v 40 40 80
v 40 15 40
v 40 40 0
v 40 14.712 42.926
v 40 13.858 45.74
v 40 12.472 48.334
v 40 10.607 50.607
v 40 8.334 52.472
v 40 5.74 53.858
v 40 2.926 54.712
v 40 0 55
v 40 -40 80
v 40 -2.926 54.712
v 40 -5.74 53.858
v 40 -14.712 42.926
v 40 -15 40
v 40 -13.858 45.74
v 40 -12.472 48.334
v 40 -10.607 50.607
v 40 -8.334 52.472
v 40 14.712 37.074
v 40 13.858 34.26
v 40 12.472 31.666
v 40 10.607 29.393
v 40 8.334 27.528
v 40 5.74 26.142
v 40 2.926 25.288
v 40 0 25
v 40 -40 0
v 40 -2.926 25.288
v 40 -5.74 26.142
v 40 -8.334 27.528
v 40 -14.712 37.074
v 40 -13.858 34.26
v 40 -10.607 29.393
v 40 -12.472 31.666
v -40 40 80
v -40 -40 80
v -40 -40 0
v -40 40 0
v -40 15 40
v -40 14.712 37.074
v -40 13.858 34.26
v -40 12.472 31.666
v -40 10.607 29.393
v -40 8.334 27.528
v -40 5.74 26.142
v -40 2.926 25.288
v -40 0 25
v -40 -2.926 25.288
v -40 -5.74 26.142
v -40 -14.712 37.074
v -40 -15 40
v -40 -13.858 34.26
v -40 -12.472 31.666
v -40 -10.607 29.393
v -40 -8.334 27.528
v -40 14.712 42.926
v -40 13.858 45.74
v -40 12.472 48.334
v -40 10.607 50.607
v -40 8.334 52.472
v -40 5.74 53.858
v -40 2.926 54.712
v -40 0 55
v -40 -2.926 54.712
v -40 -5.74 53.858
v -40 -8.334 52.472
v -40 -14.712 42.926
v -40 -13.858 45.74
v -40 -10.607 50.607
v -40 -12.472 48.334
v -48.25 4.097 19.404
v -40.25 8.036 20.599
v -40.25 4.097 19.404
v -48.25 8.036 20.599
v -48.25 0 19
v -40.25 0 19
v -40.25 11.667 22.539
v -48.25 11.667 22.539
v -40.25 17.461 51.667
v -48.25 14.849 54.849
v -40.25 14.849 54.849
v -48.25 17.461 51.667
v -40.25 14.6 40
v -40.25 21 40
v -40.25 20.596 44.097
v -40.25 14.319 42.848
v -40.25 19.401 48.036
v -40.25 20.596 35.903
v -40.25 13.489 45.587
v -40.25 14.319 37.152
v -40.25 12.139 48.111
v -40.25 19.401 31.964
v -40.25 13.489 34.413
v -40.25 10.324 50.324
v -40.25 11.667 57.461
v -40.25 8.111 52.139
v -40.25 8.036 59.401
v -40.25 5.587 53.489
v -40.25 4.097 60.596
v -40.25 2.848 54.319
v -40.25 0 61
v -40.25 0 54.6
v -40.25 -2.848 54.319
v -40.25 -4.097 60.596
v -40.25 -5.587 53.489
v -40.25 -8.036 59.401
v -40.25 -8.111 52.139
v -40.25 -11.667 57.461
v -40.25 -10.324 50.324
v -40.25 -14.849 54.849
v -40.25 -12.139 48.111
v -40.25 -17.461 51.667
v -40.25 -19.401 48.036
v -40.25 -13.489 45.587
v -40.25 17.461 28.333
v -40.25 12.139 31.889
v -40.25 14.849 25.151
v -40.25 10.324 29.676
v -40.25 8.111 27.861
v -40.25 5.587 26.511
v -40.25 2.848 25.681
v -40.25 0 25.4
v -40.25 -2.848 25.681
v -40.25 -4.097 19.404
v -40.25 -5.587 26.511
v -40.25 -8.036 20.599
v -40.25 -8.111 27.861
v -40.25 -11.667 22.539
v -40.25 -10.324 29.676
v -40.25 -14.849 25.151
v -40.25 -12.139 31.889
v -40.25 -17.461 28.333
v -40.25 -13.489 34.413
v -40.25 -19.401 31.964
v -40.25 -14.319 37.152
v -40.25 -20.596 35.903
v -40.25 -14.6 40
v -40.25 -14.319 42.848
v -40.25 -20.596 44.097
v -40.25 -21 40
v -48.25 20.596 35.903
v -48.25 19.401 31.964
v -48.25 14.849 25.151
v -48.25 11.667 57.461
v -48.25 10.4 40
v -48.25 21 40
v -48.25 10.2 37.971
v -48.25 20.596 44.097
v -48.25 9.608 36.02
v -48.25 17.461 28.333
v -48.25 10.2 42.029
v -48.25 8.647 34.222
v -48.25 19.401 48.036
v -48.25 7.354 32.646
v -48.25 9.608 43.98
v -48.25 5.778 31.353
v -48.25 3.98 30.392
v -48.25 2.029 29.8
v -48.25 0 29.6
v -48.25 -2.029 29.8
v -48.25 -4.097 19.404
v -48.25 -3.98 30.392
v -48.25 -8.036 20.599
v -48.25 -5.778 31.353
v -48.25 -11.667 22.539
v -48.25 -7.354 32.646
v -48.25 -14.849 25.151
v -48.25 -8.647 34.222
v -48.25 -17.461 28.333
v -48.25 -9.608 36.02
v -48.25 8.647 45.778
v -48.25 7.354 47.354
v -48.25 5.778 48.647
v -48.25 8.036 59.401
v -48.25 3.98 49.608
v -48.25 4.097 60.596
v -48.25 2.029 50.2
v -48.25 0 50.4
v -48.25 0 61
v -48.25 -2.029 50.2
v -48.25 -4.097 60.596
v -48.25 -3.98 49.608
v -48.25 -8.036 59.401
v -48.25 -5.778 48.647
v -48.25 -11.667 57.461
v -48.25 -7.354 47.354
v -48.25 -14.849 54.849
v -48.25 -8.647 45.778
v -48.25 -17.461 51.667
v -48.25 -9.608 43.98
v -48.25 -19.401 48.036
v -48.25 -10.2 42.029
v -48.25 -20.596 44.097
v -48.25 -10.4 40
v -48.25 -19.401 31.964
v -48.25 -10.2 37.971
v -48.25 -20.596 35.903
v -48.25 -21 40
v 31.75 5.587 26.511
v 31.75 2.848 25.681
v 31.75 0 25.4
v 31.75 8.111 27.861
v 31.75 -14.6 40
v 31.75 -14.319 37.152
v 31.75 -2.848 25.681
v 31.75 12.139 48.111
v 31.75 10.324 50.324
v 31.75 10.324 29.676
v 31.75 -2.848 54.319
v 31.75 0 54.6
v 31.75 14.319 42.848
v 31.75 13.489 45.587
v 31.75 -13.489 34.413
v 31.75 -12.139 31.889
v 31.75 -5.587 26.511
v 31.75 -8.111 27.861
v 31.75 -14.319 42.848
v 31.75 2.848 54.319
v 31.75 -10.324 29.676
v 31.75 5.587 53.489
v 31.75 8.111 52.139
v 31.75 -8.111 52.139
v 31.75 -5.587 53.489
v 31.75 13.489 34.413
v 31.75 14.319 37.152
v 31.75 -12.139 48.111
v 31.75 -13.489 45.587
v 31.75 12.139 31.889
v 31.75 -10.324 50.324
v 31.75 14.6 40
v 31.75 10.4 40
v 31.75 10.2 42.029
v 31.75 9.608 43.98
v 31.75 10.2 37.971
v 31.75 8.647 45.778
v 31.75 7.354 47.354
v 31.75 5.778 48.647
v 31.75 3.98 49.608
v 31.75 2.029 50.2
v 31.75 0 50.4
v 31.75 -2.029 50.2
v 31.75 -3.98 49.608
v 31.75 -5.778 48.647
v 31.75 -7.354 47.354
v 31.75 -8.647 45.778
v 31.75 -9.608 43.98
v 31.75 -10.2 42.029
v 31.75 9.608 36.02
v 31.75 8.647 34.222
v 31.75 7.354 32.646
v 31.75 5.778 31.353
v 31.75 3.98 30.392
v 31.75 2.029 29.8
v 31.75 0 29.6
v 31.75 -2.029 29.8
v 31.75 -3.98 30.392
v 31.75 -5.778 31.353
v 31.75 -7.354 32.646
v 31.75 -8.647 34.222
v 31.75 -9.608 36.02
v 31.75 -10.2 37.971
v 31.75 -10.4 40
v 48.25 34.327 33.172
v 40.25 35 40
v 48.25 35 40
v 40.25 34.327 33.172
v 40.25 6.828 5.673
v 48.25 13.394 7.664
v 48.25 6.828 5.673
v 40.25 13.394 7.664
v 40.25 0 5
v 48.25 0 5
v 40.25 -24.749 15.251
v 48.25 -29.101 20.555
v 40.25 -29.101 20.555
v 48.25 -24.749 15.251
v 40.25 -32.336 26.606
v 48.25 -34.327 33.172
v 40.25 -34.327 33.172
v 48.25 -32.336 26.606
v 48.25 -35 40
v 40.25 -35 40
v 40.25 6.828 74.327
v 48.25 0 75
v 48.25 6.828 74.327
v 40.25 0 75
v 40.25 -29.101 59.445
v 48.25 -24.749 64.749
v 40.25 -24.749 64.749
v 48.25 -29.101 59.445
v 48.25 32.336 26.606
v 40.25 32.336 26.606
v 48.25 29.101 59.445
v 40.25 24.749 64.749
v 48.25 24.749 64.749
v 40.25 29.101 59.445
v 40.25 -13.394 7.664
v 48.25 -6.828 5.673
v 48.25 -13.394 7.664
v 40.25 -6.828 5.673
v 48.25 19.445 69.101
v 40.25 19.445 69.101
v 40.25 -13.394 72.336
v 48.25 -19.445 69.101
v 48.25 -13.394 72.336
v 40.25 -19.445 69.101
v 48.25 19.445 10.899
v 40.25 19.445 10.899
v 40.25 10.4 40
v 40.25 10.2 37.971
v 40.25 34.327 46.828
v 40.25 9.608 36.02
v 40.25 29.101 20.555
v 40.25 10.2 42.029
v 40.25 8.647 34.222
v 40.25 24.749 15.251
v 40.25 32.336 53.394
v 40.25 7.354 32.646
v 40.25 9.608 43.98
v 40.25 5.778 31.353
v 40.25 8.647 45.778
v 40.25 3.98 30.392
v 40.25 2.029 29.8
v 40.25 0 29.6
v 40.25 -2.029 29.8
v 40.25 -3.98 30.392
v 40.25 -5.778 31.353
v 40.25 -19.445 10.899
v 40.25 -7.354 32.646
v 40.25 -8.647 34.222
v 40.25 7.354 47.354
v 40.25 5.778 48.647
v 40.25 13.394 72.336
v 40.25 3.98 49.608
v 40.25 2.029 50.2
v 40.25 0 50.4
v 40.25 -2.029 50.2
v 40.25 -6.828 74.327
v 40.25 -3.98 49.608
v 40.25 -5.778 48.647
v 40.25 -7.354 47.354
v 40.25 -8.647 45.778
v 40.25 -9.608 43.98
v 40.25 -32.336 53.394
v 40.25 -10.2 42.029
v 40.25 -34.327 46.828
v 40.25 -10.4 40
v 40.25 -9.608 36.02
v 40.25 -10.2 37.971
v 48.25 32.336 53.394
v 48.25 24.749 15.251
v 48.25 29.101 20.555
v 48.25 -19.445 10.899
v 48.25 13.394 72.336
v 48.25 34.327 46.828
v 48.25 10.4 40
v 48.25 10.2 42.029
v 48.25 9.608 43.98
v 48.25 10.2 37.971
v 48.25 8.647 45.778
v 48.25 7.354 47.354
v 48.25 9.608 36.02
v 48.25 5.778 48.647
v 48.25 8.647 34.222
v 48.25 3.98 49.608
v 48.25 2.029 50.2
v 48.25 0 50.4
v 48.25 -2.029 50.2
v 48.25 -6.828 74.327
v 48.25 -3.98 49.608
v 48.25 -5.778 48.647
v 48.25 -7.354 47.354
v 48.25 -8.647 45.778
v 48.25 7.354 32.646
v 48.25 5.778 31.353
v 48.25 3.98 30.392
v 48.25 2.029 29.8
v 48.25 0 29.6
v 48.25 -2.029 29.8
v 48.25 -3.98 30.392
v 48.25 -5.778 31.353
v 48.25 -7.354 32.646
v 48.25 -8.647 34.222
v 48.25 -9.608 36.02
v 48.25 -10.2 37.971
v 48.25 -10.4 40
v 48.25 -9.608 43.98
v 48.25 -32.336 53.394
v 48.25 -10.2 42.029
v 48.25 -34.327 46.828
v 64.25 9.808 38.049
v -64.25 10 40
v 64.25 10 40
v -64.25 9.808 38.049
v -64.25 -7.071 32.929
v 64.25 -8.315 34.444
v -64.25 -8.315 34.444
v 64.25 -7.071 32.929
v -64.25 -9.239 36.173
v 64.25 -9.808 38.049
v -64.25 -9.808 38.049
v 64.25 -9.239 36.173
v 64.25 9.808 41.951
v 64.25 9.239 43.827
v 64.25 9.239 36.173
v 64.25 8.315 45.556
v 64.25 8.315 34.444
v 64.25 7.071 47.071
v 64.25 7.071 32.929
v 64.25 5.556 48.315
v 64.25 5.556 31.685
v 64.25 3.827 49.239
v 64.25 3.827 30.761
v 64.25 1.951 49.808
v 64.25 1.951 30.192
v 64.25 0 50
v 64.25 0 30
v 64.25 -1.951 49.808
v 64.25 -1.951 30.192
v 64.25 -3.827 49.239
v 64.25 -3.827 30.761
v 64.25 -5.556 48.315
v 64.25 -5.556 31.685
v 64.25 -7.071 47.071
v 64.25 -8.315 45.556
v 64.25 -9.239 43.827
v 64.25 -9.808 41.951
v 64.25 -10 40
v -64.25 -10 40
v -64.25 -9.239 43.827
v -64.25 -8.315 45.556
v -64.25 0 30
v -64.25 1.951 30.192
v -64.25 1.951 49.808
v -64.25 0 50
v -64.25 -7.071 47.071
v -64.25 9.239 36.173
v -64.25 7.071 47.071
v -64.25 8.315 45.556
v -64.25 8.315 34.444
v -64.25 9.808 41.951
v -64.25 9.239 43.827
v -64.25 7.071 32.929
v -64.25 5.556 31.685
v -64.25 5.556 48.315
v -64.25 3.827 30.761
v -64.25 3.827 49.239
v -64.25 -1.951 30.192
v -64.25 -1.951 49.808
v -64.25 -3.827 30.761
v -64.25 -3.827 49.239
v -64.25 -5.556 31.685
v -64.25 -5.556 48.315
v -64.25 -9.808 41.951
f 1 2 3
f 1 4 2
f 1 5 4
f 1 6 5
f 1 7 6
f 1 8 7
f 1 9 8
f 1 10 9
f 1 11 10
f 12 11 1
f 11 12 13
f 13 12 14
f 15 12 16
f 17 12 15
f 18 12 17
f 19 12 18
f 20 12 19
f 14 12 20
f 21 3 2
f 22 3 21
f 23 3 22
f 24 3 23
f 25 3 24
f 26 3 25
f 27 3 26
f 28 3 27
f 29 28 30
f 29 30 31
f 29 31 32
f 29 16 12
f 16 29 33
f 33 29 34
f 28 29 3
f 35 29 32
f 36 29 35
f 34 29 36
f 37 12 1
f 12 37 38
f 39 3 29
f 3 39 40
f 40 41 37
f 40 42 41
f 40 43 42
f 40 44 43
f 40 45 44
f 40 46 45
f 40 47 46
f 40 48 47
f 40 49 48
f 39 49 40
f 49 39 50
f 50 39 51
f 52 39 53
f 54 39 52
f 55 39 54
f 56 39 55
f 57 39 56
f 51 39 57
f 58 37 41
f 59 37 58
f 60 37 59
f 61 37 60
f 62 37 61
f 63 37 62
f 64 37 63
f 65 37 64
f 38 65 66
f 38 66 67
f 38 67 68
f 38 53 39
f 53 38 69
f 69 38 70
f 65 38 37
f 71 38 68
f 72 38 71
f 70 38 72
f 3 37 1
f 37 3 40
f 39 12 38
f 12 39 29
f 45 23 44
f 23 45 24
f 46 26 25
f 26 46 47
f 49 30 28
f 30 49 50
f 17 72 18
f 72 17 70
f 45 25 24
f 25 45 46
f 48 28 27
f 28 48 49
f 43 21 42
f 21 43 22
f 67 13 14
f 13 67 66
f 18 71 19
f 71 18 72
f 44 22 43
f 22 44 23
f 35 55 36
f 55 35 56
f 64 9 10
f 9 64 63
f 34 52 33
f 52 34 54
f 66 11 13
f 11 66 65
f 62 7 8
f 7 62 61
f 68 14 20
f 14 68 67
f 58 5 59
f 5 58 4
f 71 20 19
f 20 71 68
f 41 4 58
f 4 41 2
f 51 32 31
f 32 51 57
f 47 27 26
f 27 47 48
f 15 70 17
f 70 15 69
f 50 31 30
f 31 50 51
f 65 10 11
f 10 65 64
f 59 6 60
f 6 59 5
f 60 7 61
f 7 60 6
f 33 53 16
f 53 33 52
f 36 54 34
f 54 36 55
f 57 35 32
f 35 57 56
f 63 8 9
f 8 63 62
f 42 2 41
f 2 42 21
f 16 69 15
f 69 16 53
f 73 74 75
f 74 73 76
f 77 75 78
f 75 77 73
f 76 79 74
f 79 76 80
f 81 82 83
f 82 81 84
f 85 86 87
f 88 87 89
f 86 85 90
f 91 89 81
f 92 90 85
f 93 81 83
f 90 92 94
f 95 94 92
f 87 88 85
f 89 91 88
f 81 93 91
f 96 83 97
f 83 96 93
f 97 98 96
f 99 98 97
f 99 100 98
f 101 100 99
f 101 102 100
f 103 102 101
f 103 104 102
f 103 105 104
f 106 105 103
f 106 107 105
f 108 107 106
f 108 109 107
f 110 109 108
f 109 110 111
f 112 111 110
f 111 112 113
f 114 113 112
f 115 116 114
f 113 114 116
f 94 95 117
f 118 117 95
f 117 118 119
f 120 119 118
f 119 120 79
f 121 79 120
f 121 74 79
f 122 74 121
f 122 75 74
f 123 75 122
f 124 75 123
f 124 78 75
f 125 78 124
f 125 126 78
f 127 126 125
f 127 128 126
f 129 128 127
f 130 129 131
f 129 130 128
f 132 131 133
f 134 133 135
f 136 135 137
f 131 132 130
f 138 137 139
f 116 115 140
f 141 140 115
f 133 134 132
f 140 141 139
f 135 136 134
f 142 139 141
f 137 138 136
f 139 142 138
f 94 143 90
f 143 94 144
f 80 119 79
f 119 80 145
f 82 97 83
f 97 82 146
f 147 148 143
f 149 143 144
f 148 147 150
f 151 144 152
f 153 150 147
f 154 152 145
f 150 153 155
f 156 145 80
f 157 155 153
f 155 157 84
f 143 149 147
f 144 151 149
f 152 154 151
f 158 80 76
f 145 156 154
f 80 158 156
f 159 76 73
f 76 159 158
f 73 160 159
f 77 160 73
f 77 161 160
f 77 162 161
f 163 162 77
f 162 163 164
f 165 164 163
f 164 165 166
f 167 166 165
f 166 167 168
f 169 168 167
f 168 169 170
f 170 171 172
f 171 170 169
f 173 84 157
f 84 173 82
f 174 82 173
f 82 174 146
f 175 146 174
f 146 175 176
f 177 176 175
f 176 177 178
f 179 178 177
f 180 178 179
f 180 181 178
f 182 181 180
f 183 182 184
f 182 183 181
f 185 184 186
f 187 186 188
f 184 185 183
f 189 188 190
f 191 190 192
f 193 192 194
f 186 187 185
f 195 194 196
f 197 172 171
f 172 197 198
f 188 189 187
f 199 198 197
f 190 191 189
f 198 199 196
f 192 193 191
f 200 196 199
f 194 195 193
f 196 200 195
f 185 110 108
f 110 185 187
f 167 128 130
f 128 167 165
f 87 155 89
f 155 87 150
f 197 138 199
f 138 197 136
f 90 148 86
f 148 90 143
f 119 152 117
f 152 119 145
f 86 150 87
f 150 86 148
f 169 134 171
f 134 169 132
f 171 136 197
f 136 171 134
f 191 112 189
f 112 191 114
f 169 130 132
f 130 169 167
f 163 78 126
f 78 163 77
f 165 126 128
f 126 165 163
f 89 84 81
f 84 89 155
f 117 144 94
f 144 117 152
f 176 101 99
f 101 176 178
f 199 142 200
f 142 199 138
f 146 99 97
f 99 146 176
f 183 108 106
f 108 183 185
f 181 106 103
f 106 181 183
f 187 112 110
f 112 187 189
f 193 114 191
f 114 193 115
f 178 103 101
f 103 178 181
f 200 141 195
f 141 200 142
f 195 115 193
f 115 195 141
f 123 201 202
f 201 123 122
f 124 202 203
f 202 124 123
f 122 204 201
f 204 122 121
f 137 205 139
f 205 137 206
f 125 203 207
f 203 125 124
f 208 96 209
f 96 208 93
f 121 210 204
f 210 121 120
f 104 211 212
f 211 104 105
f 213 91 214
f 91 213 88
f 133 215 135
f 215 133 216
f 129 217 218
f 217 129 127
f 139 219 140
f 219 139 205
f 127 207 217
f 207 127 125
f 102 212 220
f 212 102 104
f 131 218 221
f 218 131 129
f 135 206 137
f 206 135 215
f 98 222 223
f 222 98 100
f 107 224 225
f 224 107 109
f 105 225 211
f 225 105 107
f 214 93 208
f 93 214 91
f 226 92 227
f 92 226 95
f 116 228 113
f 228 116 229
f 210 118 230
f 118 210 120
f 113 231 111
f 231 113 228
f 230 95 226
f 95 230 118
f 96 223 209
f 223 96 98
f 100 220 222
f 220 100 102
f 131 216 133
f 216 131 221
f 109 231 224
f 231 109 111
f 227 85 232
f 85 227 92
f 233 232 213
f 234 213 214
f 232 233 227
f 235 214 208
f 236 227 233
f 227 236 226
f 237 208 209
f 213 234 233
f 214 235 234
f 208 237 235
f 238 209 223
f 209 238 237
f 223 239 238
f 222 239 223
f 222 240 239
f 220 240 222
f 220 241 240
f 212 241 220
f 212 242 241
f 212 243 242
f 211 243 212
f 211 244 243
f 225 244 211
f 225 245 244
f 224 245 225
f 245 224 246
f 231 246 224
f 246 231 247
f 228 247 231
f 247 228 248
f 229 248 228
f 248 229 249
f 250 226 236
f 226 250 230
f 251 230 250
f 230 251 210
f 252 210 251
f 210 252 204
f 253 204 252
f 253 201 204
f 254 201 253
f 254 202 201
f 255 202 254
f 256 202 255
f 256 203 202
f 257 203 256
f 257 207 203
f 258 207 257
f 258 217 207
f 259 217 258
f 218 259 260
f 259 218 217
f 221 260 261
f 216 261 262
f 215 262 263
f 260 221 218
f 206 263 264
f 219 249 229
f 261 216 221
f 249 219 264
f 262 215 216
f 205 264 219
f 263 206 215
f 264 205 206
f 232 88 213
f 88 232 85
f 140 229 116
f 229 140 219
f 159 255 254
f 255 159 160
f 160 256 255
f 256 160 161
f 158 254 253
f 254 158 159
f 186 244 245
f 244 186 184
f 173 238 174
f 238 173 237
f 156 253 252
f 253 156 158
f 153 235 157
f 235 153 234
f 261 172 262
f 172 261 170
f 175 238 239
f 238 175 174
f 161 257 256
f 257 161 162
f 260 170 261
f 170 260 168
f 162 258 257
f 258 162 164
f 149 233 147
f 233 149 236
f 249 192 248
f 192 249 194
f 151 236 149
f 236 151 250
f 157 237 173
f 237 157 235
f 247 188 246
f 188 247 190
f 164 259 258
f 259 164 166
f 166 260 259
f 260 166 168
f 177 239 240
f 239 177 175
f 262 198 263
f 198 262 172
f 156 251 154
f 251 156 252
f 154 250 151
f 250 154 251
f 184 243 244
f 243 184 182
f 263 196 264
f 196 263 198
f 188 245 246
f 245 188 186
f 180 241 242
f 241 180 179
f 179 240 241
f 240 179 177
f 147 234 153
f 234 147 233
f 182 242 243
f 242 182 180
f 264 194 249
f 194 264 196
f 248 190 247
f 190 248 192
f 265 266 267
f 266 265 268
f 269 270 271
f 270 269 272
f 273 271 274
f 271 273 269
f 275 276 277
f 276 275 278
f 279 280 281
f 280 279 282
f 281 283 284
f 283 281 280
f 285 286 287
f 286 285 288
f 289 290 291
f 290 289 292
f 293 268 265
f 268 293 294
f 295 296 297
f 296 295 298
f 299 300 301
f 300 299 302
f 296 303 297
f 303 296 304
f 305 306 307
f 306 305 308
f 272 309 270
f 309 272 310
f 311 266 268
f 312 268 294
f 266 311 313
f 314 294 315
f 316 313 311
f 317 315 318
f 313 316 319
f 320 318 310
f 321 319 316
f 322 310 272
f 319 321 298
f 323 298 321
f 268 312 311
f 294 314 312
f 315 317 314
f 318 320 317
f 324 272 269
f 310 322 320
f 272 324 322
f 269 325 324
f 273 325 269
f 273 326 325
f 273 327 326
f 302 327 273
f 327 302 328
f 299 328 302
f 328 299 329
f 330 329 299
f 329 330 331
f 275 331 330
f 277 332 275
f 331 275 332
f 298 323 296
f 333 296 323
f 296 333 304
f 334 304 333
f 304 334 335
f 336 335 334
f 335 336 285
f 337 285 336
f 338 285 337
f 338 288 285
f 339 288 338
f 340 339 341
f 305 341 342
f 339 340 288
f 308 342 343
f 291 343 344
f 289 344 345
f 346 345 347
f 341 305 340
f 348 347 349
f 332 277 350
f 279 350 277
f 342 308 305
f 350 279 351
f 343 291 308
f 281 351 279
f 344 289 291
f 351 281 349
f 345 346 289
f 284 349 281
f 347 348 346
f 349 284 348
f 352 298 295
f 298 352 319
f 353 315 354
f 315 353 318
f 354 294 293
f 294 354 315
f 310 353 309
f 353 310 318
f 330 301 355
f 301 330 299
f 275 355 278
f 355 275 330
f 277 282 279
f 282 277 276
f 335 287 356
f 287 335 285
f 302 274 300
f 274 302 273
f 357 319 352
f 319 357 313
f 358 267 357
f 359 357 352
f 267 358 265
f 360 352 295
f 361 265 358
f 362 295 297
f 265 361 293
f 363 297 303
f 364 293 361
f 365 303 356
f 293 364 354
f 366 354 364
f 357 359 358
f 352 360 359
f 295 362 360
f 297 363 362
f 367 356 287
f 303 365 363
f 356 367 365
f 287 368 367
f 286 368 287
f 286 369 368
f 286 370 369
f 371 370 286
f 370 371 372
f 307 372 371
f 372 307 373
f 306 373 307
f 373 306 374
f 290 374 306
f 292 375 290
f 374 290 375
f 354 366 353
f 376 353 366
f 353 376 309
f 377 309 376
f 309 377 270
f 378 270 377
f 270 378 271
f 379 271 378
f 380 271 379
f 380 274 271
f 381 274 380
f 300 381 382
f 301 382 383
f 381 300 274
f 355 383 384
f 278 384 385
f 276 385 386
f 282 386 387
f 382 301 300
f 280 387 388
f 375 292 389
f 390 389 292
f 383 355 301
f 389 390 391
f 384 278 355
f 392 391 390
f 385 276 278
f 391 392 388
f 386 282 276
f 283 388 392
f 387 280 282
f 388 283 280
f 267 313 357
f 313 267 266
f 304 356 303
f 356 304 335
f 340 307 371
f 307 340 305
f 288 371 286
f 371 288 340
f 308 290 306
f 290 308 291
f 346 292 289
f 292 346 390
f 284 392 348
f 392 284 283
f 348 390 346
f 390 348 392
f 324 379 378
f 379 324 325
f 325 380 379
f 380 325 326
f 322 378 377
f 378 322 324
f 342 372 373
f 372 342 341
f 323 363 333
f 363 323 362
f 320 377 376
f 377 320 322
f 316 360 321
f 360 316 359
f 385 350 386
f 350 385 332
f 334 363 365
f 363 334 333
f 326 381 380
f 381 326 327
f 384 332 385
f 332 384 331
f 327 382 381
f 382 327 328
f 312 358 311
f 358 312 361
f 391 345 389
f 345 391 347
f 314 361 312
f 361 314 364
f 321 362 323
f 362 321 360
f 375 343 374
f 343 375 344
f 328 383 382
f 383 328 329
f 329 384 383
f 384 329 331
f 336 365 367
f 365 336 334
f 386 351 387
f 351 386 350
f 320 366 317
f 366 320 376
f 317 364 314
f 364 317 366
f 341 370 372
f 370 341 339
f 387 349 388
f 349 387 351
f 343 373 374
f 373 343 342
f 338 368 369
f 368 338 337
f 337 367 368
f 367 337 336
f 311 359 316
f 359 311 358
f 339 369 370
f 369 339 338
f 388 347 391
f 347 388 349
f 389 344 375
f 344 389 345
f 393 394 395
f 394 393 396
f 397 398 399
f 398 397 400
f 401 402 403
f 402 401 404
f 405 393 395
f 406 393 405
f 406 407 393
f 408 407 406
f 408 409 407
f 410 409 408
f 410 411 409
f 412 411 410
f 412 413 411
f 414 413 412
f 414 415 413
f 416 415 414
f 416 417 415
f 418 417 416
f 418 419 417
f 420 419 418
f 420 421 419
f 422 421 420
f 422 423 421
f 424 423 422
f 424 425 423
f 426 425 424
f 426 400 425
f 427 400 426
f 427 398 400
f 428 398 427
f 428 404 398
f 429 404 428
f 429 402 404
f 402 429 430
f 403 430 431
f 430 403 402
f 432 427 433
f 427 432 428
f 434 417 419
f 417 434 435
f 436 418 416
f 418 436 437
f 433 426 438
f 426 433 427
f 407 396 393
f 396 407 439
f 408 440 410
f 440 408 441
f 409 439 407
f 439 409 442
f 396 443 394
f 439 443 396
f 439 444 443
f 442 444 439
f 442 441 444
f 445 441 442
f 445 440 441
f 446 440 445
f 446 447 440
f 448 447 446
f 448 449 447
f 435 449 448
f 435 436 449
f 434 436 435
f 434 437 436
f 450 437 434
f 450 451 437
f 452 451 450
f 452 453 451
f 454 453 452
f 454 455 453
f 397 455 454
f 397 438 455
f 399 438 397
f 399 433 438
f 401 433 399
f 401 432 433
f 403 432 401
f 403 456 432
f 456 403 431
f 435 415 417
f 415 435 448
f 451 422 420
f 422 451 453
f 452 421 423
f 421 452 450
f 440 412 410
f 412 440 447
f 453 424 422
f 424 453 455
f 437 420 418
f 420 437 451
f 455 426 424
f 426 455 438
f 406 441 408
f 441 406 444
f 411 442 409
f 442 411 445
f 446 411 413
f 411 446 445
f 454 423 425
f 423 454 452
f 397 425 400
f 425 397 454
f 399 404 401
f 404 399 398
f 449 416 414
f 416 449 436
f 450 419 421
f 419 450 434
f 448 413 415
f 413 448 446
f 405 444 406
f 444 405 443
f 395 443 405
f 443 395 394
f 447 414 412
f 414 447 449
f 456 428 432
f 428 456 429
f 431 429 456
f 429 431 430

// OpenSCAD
$fn = 32;

// ------------------------------------------------------------------------
// Bushed housing: 80 x 80 x 80 mm housing, bushing d29.2
// Every part is its own module, assembly() places them once.
// ------------------------------------------------------------------------

// --- part 1 ---
module housing() {
  difference() {
    translate([-40, -40, 0]) cube([80, 80, 80]);
    translate([0, 0, 40]) rotate([0, 90, 0]) cylinder(h = 82, d = 30, center = true);
  }
}

// --- part 2 ---
module bushing() {
  difference() {
    union() {
      cylinder(h = 8, d = 42);
      translate([0, 0, 8]) cylinder(h = 72, d = 29.2);
    }
    translate([0, 0, -1]) cylinder(h = 82, d = 20.8);
  }
}

// --- part 3 ---
module shaft() {
  translate([0, 0, -64.25]) cylinder(h = 128.5, d = 20);
}

// --- part 4 ---
module cover() {
  difference() {
    cylinder(h = 8, d = 70);
    translate([0, 0, -1]) cylinder(h = 10, d = 20.8);
  }
}

// --- assembly ---
module assembly() {
  translate([0, 0, 0]) rotate([0, 0, 0]) housing();
  translate([-48.25, 0, 40]) rotate([0, 90, 0]) bushing();
  translate([0, 0, 40]) rotate([0, 90, 0]) shaft();
  translate([40.25, 0, 40]) rotate([0, 90, 0]) cover();
}

assembly();
